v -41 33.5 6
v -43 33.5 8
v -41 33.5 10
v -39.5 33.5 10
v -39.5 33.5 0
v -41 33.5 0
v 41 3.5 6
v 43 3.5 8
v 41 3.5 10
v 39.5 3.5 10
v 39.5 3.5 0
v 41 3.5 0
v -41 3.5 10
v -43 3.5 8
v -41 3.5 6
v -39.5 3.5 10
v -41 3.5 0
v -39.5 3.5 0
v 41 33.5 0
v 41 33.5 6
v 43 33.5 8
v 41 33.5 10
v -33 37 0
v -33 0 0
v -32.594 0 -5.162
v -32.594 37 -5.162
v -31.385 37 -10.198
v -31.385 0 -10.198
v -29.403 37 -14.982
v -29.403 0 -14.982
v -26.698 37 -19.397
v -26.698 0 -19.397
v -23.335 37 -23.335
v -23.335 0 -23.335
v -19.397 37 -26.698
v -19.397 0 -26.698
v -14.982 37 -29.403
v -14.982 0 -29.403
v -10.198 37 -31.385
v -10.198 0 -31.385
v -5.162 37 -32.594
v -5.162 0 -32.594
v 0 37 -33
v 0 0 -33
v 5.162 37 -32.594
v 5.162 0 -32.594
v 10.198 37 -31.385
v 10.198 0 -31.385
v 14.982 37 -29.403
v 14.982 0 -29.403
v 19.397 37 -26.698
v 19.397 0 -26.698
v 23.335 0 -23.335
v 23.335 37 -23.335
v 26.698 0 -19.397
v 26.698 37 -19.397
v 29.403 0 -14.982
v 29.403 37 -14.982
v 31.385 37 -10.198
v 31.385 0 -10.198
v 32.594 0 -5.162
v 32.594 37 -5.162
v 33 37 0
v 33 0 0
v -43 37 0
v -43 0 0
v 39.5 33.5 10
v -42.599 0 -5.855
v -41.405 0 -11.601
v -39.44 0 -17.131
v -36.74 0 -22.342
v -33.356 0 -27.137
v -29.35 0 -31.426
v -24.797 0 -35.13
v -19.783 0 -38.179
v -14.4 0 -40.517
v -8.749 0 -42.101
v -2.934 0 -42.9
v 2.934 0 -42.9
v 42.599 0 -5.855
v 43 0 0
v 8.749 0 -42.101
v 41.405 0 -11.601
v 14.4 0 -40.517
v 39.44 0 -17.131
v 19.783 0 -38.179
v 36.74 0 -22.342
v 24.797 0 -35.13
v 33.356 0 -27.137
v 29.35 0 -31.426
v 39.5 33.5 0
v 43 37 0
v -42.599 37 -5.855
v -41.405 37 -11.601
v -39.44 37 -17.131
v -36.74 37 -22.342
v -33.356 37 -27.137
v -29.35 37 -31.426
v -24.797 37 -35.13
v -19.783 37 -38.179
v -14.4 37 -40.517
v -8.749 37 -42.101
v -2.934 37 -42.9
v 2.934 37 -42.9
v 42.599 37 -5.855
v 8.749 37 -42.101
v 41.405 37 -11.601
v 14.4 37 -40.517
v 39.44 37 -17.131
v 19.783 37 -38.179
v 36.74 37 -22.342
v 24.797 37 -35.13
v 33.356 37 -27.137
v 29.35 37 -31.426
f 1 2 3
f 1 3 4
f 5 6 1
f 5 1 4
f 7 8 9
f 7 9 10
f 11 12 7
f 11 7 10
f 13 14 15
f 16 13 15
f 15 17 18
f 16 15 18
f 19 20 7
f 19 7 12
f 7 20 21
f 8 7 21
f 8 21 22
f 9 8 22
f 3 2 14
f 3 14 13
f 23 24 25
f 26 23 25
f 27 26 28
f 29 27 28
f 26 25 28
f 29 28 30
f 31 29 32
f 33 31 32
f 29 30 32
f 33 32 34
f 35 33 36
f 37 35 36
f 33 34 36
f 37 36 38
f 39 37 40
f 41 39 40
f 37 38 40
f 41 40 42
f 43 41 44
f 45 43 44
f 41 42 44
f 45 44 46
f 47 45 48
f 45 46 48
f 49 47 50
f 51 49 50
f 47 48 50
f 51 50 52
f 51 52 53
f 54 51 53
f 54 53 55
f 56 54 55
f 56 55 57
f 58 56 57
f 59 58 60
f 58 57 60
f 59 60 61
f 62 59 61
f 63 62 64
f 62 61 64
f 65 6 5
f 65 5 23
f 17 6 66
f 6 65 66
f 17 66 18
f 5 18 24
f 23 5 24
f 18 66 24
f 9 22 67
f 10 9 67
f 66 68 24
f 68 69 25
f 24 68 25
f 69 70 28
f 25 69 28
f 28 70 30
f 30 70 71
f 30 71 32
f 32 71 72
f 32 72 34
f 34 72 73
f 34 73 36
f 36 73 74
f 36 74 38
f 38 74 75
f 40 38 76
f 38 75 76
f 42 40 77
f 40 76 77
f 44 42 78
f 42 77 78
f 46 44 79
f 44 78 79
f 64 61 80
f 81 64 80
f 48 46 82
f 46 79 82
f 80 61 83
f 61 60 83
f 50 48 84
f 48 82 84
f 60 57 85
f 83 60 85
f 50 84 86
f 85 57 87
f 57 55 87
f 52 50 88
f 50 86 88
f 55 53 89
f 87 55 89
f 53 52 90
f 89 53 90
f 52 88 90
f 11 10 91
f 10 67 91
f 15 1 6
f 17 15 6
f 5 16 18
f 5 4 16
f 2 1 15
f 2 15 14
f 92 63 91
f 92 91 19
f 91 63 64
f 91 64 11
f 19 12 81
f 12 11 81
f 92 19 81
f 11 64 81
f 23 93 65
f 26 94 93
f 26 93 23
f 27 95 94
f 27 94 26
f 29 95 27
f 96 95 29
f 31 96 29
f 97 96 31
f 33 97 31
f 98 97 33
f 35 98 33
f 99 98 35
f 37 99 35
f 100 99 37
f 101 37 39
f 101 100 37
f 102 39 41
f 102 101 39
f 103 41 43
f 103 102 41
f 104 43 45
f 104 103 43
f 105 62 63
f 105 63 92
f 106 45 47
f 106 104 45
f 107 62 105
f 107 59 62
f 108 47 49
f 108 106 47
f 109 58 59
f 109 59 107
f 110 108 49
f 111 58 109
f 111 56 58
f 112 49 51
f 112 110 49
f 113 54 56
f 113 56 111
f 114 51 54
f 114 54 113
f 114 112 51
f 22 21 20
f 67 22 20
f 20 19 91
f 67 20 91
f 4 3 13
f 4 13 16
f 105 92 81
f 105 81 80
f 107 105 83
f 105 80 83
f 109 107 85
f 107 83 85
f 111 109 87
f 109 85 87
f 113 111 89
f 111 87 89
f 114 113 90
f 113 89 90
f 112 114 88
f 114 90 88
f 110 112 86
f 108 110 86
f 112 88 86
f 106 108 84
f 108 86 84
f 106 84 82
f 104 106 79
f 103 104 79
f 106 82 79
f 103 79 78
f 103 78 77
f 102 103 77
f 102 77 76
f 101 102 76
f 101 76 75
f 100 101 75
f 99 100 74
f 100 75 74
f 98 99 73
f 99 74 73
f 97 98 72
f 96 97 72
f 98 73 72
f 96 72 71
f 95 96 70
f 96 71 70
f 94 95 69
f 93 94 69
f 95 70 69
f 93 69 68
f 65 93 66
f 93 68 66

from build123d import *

# Parameters (mm, degrees)
BOSS_EXTRUDE1_DEPTH = 37
SKETCH3_W           = 1.5
SKETCH3_H           = 10
BOSS_EXTRUDE2_DEPTH = 15


with BuildPart() as part:
    # Sketch1 → Boss-Extrude1 (new body)
    with BuildSketch(Plane(origin=(0, 0, 0), x_dir=(1, 0, 0), z_dir=(0, 1, 0))):
        with BuildLine():
            ThreePointArc((-33, 0), (0, 33), (33, 0))
            Line((33, 0), (43, 0))
            ThreePointArc((43, 0), (0, 43), (-43, 0))
            Line((-43, 0), (-33, 0))
        make_face()
    extrude(amount=BOSS_EXTRUDE1_DEPTH)

    # Sketch3 → Boss-Extrude2 (add, symmetric)
    with BuildSketch(Plane(origin=(0, 18.5, 0), x_dir=(1, 0, 0), z_dir=(0, 1, 0))):
        with Locations((-40.25, -5)):
            Rectangle(SKETCH3_W, SKETCH3_H)
        Polygon((-43, -8), (-41, -10), (-41, -6), align=None)
    boss_extrude2 = extrude(amount=BOSS_EXTRUDE2_DEPTH, both=True)

    # Mirror1: Boss-Extrude2 across plane
    add(boss_extrude2.mirror(Plane(origin=(0, 0, 0), x_dir=(0, 0, 1), z_dir=(1, 0, 0))))


solid = part.part
